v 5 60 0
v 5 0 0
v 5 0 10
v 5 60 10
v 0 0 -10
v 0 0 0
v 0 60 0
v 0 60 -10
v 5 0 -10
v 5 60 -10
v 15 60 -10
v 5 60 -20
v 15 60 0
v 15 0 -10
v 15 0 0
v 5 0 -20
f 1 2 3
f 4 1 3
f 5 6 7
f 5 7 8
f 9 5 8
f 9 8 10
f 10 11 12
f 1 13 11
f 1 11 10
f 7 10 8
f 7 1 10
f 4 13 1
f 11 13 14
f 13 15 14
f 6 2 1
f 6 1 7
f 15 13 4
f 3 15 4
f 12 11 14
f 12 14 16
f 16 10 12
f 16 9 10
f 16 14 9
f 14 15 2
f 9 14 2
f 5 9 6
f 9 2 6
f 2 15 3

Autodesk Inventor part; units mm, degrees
ref_plane "YZ Plane" through (0, 0, 0) normal (1, 0, 0) x (0, 1, 0)
ref_plane "XZ Plane" through (0, 0, 0) normal (0, 1, 0) x (-1, 0, 0)
ref_plane "XY Plane" through (0, 0, 0) normal (0, 0, 1) x (1, 0, 0)
sketch "Эскиз1" plane through (0, 0, 0) normal (0, 1, 0) x (-1, 0, 0)
  line L0 (0, 0) -> (0, -10)
  line L1 (0, -10) -> (-5, -10)
  line L2 (-5, -10) -> (-5, -20)
  line L3 (-5, -20) -> (-5, 0)
  line L4 (-5, 0) -> (0, 0)
  line L5 (-5, 0) -> (-5, 10)
  line L6 (-5, 0) -> (-15, 0)
  line L7 (-15, 0) -> (-5, 10)
  line L8 (-15, 0) -> (-15, -10)
  line L9 (-15, -10) -> (-5, -20)
  dimension "d2" = 10
  dimension "d3" = 5
  dimension "d4" = 10
  dimension "d5" = 10
  dimension "d6" = 10
extrude "Выдавливание1" add sketch "Эскиз1" along normal blind 60
properties part number "Dyenhtyytt cjtlbytybt"
